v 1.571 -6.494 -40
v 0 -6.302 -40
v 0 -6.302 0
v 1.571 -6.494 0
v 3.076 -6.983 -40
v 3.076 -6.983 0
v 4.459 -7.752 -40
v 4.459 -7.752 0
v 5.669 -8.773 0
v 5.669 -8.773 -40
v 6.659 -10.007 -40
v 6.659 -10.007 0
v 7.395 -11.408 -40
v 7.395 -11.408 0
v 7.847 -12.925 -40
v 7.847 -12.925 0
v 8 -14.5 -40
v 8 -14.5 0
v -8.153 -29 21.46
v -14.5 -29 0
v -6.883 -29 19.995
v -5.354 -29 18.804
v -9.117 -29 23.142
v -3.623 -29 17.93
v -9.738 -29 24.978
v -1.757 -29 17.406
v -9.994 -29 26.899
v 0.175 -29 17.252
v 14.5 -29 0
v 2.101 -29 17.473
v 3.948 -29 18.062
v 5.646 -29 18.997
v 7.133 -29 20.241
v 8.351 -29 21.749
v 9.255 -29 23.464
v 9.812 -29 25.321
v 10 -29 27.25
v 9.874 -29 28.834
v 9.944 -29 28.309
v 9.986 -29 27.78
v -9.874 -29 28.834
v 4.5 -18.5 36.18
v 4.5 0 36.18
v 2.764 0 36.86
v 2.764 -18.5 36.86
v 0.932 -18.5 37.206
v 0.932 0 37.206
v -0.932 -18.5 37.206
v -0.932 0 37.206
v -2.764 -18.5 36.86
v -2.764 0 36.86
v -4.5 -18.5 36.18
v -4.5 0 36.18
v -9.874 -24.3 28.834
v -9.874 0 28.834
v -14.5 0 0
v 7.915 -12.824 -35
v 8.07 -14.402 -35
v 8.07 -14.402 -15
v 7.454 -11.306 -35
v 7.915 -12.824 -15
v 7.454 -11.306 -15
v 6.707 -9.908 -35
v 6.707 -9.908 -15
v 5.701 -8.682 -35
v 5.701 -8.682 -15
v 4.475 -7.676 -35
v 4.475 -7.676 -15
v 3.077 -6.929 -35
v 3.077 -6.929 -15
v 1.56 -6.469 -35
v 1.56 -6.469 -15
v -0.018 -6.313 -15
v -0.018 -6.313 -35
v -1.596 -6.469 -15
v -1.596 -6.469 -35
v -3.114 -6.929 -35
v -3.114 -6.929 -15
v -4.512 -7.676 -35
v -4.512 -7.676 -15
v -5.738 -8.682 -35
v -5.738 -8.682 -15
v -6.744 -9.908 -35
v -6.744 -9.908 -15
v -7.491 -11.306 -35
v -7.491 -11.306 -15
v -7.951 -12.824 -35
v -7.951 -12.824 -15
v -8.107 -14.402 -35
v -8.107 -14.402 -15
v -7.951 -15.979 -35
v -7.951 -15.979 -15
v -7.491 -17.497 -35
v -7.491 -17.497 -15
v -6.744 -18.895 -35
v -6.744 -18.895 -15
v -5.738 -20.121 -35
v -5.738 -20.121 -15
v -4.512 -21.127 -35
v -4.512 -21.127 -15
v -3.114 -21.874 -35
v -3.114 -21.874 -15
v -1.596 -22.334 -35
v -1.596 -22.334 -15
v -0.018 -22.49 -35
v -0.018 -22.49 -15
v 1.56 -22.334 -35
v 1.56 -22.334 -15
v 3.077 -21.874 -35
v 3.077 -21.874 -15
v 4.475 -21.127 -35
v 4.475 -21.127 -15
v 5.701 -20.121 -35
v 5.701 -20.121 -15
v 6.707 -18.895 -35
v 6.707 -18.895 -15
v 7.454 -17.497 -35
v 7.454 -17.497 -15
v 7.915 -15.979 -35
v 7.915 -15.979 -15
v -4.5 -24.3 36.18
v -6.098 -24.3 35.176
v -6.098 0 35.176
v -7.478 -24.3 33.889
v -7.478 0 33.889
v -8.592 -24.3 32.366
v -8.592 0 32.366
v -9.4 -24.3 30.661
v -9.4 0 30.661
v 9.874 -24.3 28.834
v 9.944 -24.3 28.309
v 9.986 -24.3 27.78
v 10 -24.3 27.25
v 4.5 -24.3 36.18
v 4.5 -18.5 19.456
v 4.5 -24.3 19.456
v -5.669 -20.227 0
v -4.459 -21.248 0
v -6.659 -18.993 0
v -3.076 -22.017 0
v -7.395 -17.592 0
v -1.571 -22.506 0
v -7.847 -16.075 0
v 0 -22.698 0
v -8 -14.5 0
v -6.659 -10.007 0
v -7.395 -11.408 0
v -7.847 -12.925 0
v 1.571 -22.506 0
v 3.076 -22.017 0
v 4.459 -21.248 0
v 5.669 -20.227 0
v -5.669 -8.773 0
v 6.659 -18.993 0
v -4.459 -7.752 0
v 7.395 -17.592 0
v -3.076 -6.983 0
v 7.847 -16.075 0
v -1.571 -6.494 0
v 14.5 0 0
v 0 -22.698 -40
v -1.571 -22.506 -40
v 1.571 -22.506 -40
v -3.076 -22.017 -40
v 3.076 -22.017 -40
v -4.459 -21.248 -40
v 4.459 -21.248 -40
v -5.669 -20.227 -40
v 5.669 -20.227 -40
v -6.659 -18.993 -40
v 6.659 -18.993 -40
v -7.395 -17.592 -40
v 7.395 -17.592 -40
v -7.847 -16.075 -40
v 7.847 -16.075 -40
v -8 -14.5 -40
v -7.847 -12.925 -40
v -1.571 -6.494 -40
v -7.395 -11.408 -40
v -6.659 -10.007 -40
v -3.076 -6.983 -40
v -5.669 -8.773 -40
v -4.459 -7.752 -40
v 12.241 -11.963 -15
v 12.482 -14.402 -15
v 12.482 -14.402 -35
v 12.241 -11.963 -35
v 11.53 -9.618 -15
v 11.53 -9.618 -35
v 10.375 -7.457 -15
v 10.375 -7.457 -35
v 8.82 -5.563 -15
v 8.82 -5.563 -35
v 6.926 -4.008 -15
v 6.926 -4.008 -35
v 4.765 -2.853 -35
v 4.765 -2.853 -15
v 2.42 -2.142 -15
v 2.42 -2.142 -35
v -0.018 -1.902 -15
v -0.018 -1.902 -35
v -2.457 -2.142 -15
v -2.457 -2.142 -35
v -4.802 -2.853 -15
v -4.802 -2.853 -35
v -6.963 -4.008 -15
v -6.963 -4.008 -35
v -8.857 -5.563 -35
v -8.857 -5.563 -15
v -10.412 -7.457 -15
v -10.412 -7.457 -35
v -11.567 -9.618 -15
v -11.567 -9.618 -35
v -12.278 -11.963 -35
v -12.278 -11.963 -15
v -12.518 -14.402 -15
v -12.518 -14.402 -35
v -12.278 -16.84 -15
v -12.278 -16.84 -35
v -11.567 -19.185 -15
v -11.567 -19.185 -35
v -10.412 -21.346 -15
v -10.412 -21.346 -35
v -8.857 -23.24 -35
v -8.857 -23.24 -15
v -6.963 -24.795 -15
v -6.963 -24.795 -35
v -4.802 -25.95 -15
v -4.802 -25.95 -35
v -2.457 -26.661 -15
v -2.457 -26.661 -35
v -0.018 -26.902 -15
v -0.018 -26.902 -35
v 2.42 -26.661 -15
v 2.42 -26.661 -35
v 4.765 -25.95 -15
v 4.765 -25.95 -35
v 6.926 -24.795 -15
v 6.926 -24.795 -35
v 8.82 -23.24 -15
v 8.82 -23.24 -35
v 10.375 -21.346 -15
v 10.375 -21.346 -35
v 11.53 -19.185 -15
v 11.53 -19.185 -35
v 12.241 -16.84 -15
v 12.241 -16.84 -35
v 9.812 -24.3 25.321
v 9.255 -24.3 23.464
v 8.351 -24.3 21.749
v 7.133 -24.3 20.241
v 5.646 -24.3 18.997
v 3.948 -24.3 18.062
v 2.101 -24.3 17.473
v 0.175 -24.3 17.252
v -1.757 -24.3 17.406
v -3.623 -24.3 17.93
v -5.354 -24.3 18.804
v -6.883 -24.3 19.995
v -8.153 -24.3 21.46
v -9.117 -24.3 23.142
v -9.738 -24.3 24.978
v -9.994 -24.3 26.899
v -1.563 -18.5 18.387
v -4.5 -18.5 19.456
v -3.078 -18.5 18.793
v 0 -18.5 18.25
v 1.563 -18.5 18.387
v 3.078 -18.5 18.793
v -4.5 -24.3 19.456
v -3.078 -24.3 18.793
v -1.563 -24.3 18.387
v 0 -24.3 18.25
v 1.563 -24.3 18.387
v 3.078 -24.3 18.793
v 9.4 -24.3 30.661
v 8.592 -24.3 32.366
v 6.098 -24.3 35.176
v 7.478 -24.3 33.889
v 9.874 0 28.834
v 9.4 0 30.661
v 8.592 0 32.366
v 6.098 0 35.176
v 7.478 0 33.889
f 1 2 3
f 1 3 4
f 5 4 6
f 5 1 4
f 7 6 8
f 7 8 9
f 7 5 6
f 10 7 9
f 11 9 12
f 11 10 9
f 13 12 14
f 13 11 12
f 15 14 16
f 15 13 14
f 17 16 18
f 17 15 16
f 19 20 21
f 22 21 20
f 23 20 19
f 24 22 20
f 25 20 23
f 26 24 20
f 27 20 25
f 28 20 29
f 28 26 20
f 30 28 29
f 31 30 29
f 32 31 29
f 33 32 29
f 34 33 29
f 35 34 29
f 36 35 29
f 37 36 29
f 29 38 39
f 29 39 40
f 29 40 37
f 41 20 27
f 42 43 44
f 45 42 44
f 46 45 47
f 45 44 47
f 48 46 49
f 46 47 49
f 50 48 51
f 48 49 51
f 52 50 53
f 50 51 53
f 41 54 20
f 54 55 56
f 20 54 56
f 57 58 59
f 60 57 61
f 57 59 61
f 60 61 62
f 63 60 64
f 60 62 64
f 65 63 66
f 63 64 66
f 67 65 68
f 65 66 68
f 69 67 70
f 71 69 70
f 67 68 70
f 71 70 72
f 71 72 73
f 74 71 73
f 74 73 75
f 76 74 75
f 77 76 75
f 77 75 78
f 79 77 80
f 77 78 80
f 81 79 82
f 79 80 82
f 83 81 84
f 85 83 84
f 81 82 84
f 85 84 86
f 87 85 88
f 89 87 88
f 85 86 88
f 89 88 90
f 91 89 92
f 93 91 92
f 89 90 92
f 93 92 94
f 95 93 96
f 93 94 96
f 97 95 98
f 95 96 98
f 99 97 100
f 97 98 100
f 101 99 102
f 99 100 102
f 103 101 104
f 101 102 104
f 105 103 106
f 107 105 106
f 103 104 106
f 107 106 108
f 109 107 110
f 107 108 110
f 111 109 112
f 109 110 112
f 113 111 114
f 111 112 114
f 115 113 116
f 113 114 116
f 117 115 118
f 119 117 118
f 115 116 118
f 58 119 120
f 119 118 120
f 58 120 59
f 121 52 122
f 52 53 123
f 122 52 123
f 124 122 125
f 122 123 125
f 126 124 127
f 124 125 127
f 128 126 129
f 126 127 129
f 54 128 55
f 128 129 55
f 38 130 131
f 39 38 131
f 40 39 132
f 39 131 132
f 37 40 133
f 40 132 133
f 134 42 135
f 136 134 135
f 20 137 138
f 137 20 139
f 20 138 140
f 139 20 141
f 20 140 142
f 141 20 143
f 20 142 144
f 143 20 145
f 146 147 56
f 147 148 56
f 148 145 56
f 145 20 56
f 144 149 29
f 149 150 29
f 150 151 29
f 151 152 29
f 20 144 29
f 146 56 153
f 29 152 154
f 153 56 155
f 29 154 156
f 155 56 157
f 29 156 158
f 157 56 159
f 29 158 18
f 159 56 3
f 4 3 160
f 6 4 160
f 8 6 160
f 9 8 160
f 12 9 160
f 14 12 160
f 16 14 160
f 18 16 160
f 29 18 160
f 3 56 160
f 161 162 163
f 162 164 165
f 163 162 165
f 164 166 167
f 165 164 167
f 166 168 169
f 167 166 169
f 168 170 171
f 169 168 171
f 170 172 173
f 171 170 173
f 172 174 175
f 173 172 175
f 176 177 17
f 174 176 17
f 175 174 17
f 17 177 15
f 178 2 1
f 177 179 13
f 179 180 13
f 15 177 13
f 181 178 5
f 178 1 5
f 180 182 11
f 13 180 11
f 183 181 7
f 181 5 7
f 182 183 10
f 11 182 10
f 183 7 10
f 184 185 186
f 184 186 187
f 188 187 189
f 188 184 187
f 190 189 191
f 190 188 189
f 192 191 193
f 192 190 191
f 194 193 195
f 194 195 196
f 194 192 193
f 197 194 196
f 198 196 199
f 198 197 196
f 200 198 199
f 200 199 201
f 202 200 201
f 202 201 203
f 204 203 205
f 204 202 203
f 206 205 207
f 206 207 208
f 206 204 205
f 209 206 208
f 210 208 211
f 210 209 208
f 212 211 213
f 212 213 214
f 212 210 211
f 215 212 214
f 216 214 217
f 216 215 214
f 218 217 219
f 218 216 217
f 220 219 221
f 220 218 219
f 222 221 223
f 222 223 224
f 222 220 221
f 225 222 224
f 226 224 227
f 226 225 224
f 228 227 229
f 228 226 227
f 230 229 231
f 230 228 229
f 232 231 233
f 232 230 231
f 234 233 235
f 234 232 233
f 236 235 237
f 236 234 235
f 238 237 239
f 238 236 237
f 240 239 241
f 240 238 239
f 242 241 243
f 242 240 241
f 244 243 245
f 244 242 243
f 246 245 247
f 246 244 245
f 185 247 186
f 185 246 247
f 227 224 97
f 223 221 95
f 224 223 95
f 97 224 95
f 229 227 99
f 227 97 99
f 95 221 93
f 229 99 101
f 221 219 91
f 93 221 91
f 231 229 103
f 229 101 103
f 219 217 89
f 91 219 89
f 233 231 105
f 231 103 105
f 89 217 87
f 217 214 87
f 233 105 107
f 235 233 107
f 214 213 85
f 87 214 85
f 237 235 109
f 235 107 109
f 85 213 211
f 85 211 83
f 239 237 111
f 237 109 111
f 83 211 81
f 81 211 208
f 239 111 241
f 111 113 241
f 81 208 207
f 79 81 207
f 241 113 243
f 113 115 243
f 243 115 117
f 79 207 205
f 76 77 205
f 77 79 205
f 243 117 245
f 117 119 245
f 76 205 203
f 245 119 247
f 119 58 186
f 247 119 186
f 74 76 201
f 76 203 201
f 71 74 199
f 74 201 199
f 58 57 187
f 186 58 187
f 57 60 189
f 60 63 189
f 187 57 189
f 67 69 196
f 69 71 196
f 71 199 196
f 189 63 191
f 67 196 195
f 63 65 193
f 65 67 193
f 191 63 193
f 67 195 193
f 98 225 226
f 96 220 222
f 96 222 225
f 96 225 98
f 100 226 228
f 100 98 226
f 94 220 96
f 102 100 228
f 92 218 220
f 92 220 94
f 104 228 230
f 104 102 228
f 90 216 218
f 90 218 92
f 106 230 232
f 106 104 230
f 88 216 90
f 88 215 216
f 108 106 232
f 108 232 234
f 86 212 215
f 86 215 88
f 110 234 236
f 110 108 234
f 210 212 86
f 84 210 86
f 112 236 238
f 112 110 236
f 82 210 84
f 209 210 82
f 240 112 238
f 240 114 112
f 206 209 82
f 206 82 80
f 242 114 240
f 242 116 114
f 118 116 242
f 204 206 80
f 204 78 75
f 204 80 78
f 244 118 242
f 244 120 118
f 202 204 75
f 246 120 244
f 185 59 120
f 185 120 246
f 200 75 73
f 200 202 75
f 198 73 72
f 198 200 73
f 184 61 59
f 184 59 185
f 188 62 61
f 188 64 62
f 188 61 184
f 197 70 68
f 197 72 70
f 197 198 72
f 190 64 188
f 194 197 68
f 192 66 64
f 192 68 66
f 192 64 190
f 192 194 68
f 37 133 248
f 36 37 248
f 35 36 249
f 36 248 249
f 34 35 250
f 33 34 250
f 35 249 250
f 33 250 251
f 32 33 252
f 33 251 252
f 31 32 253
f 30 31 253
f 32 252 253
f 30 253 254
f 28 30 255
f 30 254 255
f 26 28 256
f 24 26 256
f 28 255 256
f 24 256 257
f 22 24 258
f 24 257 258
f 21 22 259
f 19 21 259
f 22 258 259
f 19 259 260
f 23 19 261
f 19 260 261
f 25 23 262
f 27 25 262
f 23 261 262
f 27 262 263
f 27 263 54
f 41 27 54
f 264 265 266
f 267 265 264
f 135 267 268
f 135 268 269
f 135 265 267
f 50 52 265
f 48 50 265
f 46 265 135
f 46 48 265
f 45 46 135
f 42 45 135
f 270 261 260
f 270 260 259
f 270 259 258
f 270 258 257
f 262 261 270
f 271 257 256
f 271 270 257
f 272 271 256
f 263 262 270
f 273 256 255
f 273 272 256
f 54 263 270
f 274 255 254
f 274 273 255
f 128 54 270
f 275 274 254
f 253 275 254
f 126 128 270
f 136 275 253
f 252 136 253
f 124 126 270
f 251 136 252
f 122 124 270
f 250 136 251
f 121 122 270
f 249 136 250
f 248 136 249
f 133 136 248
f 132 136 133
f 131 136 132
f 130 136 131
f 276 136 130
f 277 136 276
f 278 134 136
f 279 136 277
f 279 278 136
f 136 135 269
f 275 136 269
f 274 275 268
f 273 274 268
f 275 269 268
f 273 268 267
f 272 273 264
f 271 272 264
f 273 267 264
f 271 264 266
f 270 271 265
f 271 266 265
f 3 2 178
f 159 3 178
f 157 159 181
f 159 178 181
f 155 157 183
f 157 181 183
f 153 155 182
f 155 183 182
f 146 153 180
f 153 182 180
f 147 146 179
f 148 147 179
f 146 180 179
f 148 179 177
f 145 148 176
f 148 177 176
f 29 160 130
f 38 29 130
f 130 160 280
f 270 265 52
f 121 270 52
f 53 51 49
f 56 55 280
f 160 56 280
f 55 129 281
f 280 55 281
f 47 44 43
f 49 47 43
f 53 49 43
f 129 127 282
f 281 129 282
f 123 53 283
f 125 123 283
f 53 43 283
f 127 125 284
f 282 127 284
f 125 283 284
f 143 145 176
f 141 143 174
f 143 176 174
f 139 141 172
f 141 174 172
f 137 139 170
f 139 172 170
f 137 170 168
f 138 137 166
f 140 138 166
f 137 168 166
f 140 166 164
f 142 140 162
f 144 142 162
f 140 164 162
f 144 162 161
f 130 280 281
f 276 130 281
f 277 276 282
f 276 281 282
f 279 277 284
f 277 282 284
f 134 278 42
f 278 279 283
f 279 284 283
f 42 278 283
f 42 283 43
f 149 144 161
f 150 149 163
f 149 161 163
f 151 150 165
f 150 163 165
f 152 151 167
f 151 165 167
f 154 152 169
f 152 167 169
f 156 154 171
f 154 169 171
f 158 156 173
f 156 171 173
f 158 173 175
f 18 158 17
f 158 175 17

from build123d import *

# Parameters (mm, degrees)
F1_DEPTH    = 29
F2_DEPTH    = 18.5
F3_DEPTH    = 24.3
F4_START    = 6.3
F0_W        = 16
F0_H        = 35
F4_DEPTH    = 16.4
F5_T1_DEPTH = 60.5
F7_START    = -15
F6_R        = 12.5
F6_R_2      = 8.0882914417
F7_DEPTH    = 20


# Not quite as in the source:
# - a fillet or chamfer that OpenCascade refuses, or shapes differently, is made with other operations: its cross-section is extruded or revolved along the edge and cut away or added


with BuildPart() as f1:
    # F0 (on Front) → F1 (new body)
    with BuildSketch(Plane.XZ):
        with BuildLine():
            Line((-8, 0), (0, 0))
            Line((0, 0), (8, 0))
            Line((8, 0), (8.2, 0))
            Line((8.2, 0), (14.5, 0))
            Line((14.5, 0), (9.873721074, 28.8341818559))
            ThreePointArc((9.873721074, 28.8341818559), (9.9683802782, 28.0446034419), (10, 27.25))
            ThreePointArc((10, 27.25), (-0.7946034419, 17.2816197218), (-9.873721074, 28.8341818559))
            Line((-9.873721074, 28.8341818559), (-14.5, 0))
            Line((-14.5, 0), (-8.2, 0))
            Line((-8.2, 0), (-8, 0))
        make_face()
    extrude(amount=F1_DEPTH)



with BuildPart() as f2:
    # F0 (on Front) → F2 (new body)
    with BuildSketch(Plane.XZ):
        with BuildLine():
            Line((4.5, 35.0442286341), (4.5, 36.1802855497))
            ThreePointArc((4.5, 36.1802855497), (0, 37.25), (-4.5, 36.1802855497))
            Line((-4.5, 36.1802855497), (-4.5, 35.0442286341))
            Line((-4.5, 35.0442286341), (-4.5, 19.4557713659))
            ThreePointArc((-4.5, 19.4557713659), (0, 18.25), (4.5, 19.4557713659))
            Line((4.5, 19.4557713659), (4.5, 35.0442286341))
        make_face()
        with BuildLine():
            ThreePointArc((4.5, 19.4557713659), (9, 27.25), (4.5, 35.0442286341))
            Line((4.5, 35.0442286341), (4.5, 19.4557713659))
        make_face()
    extrude(amount=F2_DEPTH)


with BuildPart() as f1_1:
    add(f1.part)

    add(f2.part)  # F3 merges F2
    # F0 (on Front) → F3 (join)
    with BuildSketch(Plane.XZ):
        with BuildLine():
            ThreePointArc((10, 27.25), (9.9683802782, 28.0446034419), (9.873721074, 28.8341818559))
            ThreePointArc((9.873721074, 28.8341818559), (8.0710763996, 33.1540431698), (4.5, 36.1802855497))
            Line((4.5, 36.1802855497), (4.5, 35.0442286341))
            ThreePointArc((4.5, 35.0442286341), (9, 27.25), (4.5, 19.4557713659))
            ThreePointArc((4.5, 19.4557713659), (0, 18.25), (-4.5, 19.4557713659))
            ThreePointArc((-4.5, 19.4557713659), (-9, 27.25), (-4.5, 35.0442286341))
            Line((-4.5, 35.0442286341), (-4.5, 36.1802855497))
            ThreePointArc((-4.5, 36.1802855497), (-8.0710763996, 33.1540431698), (-9.873721074, 28.8341818559))
            ThreePointArc((-9.873721074, 28.8341818559), (-0.7946034419, 17.2816197218), (10, 27.25))
        make_face()
        with BuildLine():
            ThreePointArc((4.5, 19.4557713659), (9, 27.25), (4.5, 35.0442286341))
            Line((4.5, 35.0442286341), (4.5, 19.4557713659))
        make_face()
        with BuildLine():
            Line((-4.5, 19.4557713659), (-4.5, 35.0442286341))
            ThreePointArc((-4.5, 35.0442286341), (-9, 27.25), (-4.5, 19.4557713659))
        make_face()
    extrude(amount=F3_DEPTH)

    # F0 (on Front) → F4 (join)
    with BuildSketch(Plane.XZ.offset(F4_START)):
        with Locations((0, -22.5)):
            Rectangle(F0_W, F0_H)
        Polygon((8, 0), (0, 0), (-8, 0), (-8, -5), (8, -5), align=None)
    extrude(amount=F4_DEPTH)

    # F5: fillet of radius 8.2 on 4 edges, made by hand

    # F5_s2 → F5_t1 (cut)
    with BuildSketch(Plane.XY.offset(-60.5)):
        with BuildLine():
            ThreePointArc((0.2, -6.3), (-5.5982756057, -8.7017243943), (-8, -14.5))
            Line((-8, -14.5), (-8, -6.3))
            Line((-8, -6.3), (0.2, -6.3))
        make_face()
        with BuildLine():
            ThreePointArc((-8, -14.5), (-5.5982756057, -20.2982756057), (0.2, -22.7))
            Line((0.2, -22.7), (-8, -22.7))
            Line((-8, -22.7), (-8, -14.5))
        make_face()
        with BuildLine():
            ThreePointArc((-0.2, -6.3), (5.5982756057, -8.7017243943), (8, -14.5))
            Line((8, -14.5), (8, -6.3))
            Line((8, -6.3), (-0.2, -6.3))
        make_face()
        with BuildLine():
            ThreePointArc((-0.2, -22.7), (5.5982756057, -20.2982756057), (8, -14.5))
            Line((8, -14.5), (8, -22.7))
            Line((8, -22.7), (-0.2, -22.7))
        make_face()
    extrude(amount=F5_T1_DEPTH, mode=Mode.SUBTRACT)


with BuildPart() as f7:
    # F6 (on Top) → F7 (new body)
    with BuildSketch(Plane.XY.offset(F7_START)):
        with Locations((-0.0183524884, -14.4015014629)):
            Circle(F6_R)
        with Locations((-0.0183524884, -14.4015014629)):
            Circle(F6_R_2, mode=Mode.SUBTRACT)
    extrude(amount=-F7_DEPTH)


solid = Compound([f1_1.part, f7.part])
